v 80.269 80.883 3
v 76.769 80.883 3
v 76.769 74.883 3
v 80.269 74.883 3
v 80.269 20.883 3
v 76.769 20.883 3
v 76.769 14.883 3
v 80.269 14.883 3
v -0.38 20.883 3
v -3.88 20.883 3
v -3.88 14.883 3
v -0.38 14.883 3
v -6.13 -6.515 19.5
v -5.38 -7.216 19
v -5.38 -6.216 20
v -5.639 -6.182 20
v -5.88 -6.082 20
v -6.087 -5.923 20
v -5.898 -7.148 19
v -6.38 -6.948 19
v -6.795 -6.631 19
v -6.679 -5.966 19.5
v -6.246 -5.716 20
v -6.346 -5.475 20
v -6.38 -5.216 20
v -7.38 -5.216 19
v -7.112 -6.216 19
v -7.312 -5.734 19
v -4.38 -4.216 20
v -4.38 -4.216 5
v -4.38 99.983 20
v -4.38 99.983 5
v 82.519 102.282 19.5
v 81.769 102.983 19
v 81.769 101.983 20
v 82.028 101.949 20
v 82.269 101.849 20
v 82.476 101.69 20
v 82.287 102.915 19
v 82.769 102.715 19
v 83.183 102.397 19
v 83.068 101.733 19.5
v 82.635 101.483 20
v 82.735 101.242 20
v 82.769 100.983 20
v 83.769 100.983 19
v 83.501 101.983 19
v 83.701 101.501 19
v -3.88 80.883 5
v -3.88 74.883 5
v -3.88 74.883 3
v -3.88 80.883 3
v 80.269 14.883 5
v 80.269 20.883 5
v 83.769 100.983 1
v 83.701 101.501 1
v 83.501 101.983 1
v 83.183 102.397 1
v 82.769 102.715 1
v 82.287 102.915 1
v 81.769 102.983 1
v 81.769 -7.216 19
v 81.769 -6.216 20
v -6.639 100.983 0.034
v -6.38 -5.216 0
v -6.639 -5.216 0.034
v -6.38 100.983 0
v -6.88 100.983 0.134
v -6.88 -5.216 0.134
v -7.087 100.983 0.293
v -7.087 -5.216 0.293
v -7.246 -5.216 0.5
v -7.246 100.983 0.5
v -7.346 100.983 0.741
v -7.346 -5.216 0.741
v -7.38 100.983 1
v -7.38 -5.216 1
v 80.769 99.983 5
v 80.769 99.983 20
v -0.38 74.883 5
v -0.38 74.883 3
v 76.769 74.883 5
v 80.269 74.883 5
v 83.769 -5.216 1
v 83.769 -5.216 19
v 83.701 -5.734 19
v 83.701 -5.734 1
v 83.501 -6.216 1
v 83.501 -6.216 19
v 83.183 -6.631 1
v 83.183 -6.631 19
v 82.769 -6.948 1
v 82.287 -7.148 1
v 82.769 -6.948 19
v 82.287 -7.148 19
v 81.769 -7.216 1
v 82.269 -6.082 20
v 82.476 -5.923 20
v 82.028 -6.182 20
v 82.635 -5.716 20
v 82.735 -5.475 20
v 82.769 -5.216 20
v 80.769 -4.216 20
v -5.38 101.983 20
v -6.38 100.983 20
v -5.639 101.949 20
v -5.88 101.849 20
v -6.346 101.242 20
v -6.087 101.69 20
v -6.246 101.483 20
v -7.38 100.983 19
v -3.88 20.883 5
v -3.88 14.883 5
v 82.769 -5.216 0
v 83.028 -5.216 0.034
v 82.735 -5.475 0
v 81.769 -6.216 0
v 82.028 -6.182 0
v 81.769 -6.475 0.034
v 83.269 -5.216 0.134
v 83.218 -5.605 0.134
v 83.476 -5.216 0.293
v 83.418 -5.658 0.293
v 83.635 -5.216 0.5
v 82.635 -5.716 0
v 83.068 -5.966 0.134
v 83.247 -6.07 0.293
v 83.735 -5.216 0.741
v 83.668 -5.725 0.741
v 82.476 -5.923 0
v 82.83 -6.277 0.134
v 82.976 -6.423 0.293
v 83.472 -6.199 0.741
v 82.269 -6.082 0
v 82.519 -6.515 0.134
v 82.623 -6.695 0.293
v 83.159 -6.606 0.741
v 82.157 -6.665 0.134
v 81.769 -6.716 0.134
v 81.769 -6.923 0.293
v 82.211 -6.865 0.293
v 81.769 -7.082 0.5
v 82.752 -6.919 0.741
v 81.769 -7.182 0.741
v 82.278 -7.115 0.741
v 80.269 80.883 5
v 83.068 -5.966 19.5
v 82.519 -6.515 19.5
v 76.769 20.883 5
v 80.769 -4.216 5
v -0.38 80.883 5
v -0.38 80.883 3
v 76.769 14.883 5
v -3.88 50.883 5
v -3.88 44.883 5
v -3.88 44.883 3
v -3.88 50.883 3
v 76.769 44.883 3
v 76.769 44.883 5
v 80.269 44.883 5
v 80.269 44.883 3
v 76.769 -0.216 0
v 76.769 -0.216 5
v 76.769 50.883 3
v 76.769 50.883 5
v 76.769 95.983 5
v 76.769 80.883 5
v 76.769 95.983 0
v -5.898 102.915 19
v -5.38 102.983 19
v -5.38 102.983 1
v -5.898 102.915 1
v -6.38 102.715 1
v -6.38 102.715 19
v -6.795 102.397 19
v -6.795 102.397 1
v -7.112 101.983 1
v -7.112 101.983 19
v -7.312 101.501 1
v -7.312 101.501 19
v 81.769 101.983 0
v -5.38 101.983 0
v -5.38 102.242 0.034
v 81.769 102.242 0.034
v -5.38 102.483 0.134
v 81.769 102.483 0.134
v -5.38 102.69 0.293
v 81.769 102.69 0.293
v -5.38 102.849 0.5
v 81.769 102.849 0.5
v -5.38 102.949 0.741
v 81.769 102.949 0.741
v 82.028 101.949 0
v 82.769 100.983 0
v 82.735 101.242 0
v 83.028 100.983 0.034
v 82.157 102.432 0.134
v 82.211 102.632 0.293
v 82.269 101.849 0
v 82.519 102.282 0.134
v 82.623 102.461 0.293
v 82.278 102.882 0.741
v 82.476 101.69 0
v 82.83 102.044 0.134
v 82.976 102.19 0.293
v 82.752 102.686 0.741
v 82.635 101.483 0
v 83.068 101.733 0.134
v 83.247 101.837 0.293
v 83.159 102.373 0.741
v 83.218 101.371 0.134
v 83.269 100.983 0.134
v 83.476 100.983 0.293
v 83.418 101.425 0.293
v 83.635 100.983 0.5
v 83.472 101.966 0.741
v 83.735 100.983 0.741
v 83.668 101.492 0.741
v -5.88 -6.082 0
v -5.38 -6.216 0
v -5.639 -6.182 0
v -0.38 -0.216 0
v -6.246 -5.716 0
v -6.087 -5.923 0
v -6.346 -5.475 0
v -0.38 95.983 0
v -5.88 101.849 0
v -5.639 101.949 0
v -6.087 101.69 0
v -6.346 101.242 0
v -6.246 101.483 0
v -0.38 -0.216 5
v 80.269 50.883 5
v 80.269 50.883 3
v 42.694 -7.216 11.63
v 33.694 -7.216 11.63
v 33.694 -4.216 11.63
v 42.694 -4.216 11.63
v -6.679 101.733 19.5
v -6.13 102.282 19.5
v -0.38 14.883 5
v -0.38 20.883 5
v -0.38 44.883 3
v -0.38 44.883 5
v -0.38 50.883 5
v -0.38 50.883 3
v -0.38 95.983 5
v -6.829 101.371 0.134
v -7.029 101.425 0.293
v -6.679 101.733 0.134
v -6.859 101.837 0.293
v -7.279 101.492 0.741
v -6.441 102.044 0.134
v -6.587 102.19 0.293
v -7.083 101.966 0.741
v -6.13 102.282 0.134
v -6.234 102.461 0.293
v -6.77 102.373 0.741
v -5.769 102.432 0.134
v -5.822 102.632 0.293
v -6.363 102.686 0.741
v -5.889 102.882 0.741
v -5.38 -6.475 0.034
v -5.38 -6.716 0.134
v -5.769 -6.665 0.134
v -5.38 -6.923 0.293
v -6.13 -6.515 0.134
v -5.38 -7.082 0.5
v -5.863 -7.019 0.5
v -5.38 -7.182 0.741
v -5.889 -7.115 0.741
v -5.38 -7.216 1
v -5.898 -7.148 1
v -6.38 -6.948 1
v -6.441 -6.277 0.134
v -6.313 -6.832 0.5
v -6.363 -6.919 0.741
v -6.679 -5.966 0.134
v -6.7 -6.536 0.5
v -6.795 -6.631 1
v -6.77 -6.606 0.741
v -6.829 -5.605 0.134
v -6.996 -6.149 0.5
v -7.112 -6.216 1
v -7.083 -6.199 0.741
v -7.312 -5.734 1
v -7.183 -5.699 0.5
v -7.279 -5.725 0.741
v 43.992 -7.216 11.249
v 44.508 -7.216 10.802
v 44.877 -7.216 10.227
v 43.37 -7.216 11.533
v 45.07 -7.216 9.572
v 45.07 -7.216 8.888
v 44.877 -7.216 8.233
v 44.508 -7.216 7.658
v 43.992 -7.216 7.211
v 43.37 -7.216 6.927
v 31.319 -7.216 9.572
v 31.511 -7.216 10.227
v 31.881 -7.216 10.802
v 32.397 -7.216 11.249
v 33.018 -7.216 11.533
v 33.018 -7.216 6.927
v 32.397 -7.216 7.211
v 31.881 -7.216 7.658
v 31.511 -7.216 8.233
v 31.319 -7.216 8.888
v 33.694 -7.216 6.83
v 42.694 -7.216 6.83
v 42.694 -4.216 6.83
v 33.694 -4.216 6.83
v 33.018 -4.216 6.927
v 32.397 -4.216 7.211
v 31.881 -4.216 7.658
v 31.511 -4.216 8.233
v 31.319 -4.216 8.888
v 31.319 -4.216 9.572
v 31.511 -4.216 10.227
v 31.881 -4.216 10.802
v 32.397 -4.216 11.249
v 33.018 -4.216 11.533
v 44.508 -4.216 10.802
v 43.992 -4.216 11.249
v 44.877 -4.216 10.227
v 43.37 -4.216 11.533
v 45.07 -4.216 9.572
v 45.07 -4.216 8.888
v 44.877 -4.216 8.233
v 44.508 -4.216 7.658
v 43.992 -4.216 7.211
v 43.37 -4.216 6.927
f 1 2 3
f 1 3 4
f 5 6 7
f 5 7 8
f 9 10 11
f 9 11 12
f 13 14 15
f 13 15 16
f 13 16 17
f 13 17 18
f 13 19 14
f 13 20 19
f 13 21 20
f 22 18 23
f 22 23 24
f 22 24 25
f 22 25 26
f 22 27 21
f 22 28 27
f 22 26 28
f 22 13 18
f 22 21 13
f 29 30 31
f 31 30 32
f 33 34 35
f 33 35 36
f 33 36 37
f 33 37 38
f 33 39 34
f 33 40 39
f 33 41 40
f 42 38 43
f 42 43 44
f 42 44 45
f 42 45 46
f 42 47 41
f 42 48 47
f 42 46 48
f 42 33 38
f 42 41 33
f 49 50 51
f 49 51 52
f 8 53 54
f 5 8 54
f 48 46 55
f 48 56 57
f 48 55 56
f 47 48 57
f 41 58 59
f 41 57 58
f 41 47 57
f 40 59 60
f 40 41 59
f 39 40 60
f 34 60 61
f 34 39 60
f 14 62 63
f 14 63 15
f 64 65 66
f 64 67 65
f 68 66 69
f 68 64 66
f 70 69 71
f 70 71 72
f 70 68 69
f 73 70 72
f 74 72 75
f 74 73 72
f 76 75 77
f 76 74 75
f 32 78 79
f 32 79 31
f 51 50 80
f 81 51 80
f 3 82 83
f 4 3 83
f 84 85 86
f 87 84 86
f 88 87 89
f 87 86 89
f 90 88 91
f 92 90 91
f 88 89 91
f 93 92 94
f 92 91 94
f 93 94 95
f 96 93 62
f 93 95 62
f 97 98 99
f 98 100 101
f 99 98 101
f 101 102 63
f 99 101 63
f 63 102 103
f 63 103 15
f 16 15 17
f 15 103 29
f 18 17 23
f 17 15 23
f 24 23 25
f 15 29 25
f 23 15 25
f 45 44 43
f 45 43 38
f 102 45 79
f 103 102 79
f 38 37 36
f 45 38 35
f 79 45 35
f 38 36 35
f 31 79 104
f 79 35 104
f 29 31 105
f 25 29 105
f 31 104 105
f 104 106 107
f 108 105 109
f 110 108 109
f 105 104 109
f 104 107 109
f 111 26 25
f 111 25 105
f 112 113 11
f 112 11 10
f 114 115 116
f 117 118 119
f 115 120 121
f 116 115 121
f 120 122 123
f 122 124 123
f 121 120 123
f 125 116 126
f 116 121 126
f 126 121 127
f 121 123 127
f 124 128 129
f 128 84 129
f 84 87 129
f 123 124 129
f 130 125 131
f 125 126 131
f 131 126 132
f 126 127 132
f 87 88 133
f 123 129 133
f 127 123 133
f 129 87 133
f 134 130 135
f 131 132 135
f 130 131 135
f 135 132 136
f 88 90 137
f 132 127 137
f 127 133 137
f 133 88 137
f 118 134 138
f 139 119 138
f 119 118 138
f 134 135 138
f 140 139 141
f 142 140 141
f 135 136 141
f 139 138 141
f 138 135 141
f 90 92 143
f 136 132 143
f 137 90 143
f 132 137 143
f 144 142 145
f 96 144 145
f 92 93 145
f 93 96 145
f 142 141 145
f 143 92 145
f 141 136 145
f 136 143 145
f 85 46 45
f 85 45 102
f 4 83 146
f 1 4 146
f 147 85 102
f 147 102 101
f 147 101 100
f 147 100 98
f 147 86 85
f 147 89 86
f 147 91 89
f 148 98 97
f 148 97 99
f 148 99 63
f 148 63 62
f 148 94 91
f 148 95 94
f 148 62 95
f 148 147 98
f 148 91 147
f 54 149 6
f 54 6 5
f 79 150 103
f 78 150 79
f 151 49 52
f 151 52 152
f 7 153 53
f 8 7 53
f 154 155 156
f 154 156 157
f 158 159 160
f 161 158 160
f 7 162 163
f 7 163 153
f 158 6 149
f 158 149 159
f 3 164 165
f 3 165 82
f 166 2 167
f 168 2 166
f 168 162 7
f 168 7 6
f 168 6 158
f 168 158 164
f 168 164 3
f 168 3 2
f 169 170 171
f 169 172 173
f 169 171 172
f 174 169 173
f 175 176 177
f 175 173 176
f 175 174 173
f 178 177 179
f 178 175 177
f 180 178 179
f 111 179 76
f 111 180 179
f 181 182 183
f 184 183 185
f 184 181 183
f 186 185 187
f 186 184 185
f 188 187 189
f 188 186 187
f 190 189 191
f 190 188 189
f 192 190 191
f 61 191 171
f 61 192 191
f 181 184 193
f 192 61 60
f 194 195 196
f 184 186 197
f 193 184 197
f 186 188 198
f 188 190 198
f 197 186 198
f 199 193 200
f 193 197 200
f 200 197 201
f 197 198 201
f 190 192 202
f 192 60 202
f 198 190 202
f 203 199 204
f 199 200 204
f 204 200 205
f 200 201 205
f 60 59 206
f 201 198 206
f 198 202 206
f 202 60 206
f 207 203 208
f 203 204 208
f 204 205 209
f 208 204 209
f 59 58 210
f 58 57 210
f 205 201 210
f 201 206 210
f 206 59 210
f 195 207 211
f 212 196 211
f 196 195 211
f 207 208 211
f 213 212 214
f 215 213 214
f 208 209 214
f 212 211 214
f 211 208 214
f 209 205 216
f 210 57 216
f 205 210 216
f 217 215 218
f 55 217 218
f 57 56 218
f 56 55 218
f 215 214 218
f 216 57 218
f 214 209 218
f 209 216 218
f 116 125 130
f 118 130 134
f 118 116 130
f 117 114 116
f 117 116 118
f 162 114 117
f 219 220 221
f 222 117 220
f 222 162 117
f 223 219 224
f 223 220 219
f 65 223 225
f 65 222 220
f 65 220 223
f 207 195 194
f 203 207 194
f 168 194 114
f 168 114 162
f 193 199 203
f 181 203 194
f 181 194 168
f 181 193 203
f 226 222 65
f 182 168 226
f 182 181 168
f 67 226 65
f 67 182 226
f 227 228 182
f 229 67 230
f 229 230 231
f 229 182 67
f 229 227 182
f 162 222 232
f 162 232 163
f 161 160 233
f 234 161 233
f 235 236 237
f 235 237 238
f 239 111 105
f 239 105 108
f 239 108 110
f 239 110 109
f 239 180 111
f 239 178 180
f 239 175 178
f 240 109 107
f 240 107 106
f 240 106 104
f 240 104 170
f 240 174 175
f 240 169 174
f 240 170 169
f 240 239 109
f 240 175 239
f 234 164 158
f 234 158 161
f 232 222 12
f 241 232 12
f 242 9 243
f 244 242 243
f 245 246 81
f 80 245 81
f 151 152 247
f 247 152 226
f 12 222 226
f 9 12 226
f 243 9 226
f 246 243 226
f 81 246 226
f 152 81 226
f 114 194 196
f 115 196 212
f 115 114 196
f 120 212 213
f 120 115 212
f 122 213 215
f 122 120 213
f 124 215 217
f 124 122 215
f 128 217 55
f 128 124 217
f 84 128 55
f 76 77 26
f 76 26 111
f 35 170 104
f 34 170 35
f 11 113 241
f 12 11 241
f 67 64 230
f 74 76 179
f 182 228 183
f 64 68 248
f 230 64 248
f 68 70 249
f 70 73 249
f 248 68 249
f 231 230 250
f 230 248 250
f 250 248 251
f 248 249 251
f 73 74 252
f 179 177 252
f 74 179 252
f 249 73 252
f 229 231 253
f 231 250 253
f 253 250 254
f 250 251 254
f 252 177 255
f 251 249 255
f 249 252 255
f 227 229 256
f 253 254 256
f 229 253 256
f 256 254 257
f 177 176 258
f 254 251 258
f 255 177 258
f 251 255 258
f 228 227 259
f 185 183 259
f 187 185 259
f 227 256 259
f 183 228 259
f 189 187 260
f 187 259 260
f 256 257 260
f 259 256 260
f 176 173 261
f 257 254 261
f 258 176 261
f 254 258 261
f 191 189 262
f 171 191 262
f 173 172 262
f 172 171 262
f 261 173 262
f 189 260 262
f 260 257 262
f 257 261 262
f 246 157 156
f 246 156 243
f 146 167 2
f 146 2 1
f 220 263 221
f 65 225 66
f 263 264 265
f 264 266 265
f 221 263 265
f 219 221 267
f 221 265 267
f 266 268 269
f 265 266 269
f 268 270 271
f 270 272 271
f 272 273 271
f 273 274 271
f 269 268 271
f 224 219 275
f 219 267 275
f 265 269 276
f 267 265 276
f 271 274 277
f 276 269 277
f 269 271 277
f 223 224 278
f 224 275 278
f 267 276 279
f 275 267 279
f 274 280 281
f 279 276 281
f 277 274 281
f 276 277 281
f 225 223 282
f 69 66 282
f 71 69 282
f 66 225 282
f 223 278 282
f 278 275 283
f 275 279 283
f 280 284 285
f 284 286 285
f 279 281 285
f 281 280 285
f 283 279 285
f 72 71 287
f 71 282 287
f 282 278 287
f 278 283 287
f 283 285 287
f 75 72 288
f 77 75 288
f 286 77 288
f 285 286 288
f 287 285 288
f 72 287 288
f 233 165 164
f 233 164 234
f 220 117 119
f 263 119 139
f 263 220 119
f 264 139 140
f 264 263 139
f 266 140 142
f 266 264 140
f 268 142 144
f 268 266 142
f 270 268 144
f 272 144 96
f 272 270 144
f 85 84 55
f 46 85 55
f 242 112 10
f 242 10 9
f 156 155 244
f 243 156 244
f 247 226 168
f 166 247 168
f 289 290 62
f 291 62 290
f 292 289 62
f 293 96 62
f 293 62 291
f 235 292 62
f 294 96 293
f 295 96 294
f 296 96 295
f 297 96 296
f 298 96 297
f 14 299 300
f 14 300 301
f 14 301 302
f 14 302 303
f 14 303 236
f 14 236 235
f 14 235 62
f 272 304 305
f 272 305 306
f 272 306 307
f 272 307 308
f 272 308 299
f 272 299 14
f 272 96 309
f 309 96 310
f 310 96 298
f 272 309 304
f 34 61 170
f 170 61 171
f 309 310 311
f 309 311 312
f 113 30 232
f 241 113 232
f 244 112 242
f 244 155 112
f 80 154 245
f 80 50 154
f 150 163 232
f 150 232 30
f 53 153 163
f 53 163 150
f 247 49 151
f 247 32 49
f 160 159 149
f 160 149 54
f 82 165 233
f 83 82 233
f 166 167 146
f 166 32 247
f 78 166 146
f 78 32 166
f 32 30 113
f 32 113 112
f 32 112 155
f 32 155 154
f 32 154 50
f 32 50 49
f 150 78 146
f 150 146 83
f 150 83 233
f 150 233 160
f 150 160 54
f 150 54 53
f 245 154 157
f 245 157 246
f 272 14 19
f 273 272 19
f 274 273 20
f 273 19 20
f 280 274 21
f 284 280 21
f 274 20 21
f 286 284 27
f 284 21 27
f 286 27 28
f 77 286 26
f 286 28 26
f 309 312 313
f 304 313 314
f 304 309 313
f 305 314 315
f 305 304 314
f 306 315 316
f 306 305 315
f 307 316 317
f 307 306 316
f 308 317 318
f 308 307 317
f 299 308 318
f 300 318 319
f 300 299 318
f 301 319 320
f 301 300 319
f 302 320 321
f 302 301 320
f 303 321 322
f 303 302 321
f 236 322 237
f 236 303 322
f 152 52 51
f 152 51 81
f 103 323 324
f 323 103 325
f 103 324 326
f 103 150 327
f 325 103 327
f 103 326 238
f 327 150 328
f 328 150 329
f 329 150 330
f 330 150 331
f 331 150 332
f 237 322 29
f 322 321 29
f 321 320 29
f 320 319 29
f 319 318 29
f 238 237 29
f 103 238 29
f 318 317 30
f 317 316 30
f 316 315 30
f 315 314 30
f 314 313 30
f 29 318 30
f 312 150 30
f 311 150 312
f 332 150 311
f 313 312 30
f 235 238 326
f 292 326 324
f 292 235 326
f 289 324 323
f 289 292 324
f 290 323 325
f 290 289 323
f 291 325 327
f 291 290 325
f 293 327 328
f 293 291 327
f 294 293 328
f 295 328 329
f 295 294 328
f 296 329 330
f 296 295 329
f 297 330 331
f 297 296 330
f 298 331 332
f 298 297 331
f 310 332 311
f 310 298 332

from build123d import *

# Parameters (mm, degrees)
MODEL_W             = 85.14935
MODEL_H             = 104.19946
MODEL_W_2           = 77.14935
MODEL_H_2           = 96.19946
EXTRUDE_2_DEPTH     = 5
SKETCH_2_W          = 3.5
SKETCH_2_H          = 6
CUT_EXTRUDE_1_DEPTH = 2
SKETCH_4_W          = 91.14935
SKETCH_4_H          = 110.19946
SKETCH_4_W_2        = 85.14935
SKETCH_4_H_2        = 104.19946
EXTRUDE_5_DEPTH     = 20
FILLET_1_R          = 2
CHAMFER_1_SIZE      = 1
FILLET_2_R          = 1
CUT_EXTRUDE_2_DEPTH = 10


with BuildPart() as part:
    # Model → 凸台-拉伸2 (new body)
    with BuildSketch(Plane.XY):
        with Locations((38.194325, 47.88337)):
            Rectangle(MODEL_W, MODEL_H)
        with Locations((38.194325, 47.88337)):
            Rectangle(MODEL_W_2, MODEL_H_2, mode=Mode.SUBTRACT)
    extrude(amount=EXTRUDE_2_DEPTH)

    # 草图2 → 切除-拉伸1 (cut)
    with BuildSketch(Plane.XY.offset(5)):
        with Locations((-2.13035, 77.88337)):
            Rectangle(SKETCH_2_W, SKETCH_2_H)
        with Locations((78.519, 77.88337)):
            Rectangle(SKETCH_2_W, SKETCH_2_H)
        with Locations((-2.13035, 47.88337)):
            Rectangle(SKETCH_2_W, SKETCH_2_H)
        with Locations((78.519, 47.88337)):
            Rectangle(SKETCH_2_W, SKETCH_2_H)
        with Locations((-2.13035, 17.88337)):
            Rectangle(SKETCH_2_W, SKETCH_2_H)
        with Locations((78.519, 17.88337)):
            Rectangle(SKETCH_2_W, SKETCH_2_H)
    extrude(amount=-CUT_EXTRUDE_1_DEPTH, mode=Mode.SUBTRACT)

    # 草图4 → 凸台-拉伸5 (add)
    with BuildSketch(Plane(origin=(0, 0, 0), x_dir=(-1, 0, 0), z_dir=(0, 0, -1))):
        with Locations((-38.194325, 47.88337)):
            Rectangle(SKETCH_4_W, SKETCH_4_H)
        with Locations((-38.194325, 47.88337)):
            Rectangle(SKETCH_4_W_2, SKETCH_4_H_2, mode=Mode.SUBTRACT)
    extrude(amount=-EXTRUDE_5_DEPTH)

    # 圆角1
    fillet_1_edges = [part.edges().sort_by_distance(p)[0] for p in [
        (83.769, 102.9831, 10),
        (-7.38035, 102.9831, 10),
        (-7.38035, -7.21636, 10),
        (83.769, -7.21636, 10),
    ]]
    fillet(fillet_1_edges, radius=FILLET_1_R)

    # 倒角1
    chamfer_1_edges = [part.edges().sort_by_distance(p)[0] for p in [
        (-7.38035, 47.88337, 20),
        (38.194325, 102.9831, 20),
        (38.194325, -7.21636, 20),
        (83.769, 47.88337, 20),
        (-6.794563562, -6.630573562, 20),
        (83.183213562, -6.630573562, 20),
        (83.183213562, 102.397313562, 20),
        (-6.794563562, 102.397313562, 20),
    ]]
    chamfer(chamfer_1_edges, length=CHAMFER_1_SIZE)

    # 圆角2
    fillet_2_edges = [part.edges().sort_by_distance(p)[0] for p in [
        (-7.38035, 47.88337, 0),
        (38.194325, 102.9831, 0),
        (83.769, 47.88337, 0),
        (38.194325, -7.21636, 0),
        (-6.794563562, -6.630573562, 0),
        (83.183213562, -6.630573562, 0),
        (83.183213562, 102.397313562, 0),
        (-6.794563562, 102.397313562, 0),
    ]]
    fillet(fillet_2_edges, radius=FILLET_2_R)

    # 草图5 → 切除-拉伸2 (cut)
    with BuildSketch(Plane(origin=(76.38865, -7.21636, 20), x_dir=(-1, 0, 0), z_dir=(0, -1, 0))):
        with BuildLine():
            Line((33.694325, 13.169990539), (42.694325, 13.169990539))
            ThreePointArc((42.694325, 13.169990539), (45.094325, 10.769990539), (42.694325, 8.369990539))
            Line((42.694325, 8.369990539), (33.694325, 8.369990539))
            ThreePointArc((33.694325, 8.369990539), (31.294325, 10.769990539), (33.694325, 13.169990539))
        make_face()
    extrude(amount=-CUT_EXTRUDE_2_DEPTH, mode=Mode.SUBTRACT)


solid = part.part
